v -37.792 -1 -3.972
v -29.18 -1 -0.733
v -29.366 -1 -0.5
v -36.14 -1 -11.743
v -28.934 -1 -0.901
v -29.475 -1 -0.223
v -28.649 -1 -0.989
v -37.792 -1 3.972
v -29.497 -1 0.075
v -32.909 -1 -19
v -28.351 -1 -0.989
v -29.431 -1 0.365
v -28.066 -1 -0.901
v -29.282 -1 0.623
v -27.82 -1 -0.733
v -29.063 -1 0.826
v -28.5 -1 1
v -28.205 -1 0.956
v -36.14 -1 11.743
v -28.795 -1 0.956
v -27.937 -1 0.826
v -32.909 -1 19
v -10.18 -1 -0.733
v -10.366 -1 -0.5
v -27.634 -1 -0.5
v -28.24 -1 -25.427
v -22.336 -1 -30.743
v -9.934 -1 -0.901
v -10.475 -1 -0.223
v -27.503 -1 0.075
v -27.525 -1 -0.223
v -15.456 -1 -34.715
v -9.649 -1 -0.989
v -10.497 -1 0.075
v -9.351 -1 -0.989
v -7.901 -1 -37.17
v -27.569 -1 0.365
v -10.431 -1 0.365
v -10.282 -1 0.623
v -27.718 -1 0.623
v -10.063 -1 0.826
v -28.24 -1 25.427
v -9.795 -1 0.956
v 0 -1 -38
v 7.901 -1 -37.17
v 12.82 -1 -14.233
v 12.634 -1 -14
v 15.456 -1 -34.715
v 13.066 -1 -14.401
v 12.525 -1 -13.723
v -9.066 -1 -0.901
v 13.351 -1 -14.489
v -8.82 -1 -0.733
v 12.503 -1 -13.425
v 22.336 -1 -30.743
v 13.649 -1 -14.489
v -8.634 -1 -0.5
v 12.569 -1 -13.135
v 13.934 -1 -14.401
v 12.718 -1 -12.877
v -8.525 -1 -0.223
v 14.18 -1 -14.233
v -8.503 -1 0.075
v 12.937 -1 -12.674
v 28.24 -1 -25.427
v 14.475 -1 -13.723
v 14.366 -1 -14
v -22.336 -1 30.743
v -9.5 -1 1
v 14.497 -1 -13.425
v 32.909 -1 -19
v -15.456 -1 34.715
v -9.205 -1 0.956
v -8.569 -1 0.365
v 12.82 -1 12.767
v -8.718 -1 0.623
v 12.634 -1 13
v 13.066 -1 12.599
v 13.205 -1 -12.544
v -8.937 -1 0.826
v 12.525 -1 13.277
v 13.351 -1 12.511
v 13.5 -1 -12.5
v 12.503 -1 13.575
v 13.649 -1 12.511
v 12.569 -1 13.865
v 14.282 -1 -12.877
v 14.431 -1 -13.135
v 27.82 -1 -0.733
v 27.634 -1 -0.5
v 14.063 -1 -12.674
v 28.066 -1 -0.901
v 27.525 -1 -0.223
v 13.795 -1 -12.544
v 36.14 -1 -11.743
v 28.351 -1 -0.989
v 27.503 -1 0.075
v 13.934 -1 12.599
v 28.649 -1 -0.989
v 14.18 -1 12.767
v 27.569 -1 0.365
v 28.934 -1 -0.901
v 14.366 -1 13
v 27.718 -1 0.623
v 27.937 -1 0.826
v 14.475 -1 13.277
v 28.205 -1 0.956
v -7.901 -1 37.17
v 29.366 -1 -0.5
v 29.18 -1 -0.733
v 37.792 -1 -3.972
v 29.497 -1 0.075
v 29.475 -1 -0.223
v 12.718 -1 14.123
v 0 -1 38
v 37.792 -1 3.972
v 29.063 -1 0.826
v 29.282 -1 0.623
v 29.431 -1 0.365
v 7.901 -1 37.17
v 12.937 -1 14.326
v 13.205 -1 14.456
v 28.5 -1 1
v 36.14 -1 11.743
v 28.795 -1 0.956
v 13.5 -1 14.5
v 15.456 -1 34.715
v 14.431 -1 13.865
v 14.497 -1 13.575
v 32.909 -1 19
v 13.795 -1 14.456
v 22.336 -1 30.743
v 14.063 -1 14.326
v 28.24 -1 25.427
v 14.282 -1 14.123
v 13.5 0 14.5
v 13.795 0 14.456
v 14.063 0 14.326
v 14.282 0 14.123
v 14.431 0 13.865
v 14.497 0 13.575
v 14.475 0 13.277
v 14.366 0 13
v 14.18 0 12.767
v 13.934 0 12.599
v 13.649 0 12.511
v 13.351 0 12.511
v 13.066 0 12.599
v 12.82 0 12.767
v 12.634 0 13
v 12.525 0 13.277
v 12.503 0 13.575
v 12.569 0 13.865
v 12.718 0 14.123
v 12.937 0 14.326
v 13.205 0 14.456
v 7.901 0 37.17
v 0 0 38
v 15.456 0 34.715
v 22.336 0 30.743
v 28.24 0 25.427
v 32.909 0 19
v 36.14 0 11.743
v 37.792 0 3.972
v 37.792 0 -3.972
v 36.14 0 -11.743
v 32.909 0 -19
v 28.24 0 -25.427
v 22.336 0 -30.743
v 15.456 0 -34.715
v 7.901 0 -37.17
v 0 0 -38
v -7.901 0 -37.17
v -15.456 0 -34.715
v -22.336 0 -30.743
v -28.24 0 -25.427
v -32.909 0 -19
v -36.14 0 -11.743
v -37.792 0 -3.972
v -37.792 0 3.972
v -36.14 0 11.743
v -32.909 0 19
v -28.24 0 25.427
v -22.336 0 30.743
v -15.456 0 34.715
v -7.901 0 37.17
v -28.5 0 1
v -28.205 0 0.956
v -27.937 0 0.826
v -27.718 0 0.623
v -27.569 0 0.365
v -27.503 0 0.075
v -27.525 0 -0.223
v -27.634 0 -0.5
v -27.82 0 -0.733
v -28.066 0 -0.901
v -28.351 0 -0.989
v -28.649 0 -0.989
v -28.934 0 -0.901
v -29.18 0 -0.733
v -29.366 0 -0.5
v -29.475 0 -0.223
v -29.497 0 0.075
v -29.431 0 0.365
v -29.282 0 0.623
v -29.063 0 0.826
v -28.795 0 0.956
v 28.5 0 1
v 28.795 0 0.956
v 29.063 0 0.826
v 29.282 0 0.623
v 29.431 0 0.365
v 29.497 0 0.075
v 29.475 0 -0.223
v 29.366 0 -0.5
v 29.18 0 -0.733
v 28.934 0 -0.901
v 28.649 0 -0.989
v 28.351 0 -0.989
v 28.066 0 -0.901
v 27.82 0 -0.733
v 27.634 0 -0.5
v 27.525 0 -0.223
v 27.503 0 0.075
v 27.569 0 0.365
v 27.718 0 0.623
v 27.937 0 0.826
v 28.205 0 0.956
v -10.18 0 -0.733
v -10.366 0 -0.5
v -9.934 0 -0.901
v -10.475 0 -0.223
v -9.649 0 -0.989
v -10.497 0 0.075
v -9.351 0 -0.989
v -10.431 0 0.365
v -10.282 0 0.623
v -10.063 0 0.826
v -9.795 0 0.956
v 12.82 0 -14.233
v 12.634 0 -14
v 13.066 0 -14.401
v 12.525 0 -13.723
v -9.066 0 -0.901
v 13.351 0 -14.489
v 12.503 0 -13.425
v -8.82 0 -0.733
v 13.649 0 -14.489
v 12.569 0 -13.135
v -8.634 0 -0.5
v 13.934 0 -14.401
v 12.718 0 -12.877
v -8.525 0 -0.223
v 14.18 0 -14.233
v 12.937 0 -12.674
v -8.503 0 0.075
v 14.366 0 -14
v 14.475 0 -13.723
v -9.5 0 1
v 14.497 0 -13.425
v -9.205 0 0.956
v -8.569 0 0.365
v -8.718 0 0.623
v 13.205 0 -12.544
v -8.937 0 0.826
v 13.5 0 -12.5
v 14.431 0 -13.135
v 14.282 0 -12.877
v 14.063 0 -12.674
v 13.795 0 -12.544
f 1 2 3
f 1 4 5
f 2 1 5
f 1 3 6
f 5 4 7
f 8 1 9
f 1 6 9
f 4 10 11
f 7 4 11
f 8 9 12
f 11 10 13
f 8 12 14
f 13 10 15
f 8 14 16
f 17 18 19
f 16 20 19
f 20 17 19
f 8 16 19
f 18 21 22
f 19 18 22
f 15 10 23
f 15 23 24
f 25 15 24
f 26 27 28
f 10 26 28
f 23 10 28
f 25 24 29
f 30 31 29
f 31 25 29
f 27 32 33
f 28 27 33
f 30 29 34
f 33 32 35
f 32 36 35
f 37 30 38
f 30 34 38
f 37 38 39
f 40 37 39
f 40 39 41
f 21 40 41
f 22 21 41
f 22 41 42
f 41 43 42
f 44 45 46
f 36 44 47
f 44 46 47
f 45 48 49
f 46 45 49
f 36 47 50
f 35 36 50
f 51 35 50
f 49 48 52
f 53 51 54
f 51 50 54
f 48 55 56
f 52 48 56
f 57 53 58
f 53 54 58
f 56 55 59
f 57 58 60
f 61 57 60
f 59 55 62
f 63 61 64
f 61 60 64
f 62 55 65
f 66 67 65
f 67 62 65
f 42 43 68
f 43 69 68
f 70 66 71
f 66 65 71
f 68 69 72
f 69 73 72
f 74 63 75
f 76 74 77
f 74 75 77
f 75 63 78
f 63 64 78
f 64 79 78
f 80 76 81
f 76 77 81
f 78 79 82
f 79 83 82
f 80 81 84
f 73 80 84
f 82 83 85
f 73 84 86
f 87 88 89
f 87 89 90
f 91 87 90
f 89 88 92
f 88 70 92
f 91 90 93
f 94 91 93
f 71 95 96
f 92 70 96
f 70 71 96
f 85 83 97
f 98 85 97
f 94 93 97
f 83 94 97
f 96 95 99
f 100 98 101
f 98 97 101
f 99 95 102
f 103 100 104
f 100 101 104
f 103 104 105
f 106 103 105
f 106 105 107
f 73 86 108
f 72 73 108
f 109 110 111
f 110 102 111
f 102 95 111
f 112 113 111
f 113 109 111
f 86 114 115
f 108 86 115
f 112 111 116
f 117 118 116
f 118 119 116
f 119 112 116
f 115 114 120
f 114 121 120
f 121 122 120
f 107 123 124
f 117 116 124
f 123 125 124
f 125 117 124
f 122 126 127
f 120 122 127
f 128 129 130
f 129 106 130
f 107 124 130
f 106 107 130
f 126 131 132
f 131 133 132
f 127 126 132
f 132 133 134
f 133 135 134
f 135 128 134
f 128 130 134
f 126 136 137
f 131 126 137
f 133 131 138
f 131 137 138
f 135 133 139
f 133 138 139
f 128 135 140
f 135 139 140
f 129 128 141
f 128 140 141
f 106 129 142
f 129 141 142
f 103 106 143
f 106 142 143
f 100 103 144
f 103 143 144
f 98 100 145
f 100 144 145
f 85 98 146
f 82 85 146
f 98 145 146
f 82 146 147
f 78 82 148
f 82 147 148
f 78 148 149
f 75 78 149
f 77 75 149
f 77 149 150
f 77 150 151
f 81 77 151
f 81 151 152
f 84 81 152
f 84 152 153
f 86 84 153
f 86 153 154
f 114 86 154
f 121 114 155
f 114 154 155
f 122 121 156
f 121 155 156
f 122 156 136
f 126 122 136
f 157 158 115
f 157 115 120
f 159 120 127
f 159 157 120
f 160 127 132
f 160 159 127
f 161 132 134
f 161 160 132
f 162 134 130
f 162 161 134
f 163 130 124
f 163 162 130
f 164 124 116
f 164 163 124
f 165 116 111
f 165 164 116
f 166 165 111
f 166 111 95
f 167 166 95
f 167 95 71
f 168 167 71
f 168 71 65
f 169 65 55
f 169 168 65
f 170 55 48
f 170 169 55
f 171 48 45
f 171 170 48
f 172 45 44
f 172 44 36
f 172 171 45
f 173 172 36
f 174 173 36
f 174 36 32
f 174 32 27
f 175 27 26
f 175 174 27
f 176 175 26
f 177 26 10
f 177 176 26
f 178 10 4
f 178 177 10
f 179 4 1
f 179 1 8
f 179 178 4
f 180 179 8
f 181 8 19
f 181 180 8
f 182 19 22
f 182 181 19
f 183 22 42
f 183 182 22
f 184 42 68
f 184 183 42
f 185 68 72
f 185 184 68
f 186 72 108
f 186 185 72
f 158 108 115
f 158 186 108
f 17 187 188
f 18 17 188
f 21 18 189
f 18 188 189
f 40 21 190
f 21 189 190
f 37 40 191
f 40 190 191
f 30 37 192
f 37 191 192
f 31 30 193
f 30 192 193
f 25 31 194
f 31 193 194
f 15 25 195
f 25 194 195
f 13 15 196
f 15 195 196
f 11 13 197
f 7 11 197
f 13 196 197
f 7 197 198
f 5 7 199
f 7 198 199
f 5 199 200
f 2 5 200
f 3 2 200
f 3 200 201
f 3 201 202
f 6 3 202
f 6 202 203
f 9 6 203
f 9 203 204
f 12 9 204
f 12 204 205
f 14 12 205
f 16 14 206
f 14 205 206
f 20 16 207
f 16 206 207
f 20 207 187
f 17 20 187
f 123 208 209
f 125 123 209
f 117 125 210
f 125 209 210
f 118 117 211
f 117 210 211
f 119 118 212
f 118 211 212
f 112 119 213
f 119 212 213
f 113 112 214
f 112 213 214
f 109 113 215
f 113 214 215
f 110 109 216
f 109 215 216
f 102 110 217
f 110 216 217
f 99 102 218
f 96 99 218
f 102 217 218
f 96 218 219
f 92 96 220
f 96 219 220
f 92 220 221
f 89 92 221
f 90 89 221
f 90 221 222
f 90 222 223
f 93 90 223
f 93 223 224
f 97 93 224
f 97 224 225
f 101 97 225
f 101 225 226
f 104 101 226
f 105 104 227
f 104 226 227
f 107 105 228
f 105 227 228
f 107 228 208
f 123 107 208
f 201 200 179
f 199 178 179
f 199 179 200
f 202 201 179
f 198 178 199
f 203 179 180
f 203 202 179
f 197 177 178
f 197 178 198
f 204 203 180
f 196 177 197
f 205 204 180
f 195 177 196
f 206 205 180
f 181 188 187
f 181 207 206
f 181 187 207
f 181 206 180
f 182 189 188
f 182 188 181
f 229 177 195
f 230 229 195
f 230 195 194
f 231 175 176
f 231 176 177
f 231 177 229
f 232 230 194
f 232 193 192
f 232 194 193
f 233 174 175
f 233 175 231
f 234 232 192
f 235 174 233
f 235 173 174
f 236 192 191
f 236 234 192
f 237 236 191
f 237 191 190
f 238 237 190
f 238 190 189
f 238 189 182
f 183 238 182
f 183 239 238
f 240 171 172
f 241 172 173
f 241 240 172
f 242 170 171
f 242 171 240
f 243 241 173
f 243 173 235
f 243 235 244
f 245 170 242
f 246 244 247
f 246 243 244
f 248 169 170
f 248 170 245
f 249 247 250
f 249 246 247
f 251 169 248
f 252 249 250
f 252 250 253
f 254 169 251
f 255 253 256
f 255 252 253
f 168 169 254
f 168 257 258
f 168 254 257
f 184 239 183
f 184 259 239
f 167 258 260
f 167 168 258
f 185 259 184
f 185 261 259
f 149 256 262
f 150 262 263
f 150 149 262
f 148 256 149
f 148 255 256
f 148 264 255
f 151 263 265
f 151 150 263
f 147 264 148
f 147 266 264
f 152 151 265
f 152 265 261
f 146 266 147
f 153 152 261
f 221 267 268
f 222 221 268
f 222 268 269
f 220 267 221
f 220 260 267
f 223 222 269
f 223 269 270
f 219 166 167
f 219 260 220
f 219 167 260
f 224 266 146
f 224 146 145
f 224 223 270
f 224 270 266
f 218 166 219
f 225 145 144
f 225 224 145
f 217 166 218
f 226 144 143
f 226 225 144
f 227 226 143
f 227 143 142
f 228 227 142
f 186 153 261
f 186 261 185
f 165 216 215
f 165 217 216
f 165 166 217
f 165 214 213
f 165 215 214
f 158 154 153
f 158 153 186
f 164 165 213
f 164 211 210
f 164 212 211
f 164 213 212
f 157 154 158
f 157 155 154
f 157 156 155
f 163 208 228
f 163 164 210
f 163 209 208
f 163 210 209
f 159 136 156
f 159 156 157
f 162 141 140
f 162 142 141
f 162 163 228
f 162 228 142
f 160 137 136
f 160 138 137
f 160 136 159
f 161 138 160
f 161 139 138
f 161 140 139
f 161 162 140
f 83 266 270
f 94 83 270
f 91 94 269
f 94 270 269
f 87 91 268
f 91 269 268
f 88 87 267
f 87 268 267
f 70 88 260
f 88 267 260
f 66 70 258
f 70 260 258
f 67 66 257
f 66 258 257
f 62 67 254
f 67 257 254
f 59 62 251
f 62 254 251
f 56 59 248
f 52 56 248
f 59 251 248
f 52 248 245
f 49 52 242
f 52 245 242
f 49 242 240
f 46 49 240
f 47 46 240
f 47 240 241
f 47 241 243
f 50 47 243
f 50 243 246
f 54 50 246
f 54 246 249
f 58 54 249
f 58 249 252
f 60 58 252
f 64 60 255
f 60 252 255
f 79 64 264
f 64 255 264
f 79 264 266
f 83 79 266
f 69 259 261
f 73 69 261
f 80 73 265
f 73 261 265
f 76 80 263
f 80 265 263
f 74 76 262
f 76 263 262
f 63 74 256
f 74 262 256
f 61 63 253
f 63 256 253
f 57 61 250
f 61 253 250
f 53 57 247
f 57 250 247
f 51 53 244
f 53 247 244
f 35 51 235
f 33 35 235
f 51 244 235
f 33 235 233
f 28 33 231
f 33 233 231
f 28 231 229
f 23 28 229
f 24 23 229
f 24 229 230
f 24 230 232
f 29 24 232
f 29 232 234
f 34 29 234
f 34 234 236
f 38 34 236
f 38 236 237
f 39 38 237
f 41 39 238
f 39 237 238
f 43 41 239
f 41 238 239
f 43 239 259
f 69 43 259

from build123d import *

# Parameters (mm, degrees)
SKETCH1_R           = 38
SKETCH1_R_2         = 1
BOSS_EXTRUDE1_DEPTH = 1


with BuildPart() as part:
    # Sketch1 → Boss-Extrude1 (new body)
    with BuildSketch(Plane(origin=(0, 0, 0), x_dir=(1, 0, 0), z_dir=(0, 1, 0))):
        with Locations(Location((0, 0, 0), (0, 0, 270))):
            Circle(SKETCH1_R)
        with Locations(Location((28.5, 0, 0), (0, 0, 270))):
            Circle(SKETCH1_R_2, mode=Mode.SUBTRACT)
        with Locations(Location((-28.5, 0, 0), (0, 0, 270))):
            Circle(SKETCH1_R_2, mode=Mode.SUBTRACT)
        with Locations(Location((13.5, 13.5, 0), (0, 0, 270))):
            Circle(SKETCH1_R_2, mode=Mode.SUBTRACT)
        with Locations(Location((13.5, -13.5, 0), (0, 0, 270))):
            Circle(SKETCH1_R_2, mode=Mode.SUBTRACT)
        with Locations(Location((-9.5, 0, 0), (0, 0, 270))):
            Circle(SKETCH1_R_2, mode=Mode.SUBTRACT)
    extrude(amount=-BOSS_EXTRUDE1_DEPTH)


solid = part.part
